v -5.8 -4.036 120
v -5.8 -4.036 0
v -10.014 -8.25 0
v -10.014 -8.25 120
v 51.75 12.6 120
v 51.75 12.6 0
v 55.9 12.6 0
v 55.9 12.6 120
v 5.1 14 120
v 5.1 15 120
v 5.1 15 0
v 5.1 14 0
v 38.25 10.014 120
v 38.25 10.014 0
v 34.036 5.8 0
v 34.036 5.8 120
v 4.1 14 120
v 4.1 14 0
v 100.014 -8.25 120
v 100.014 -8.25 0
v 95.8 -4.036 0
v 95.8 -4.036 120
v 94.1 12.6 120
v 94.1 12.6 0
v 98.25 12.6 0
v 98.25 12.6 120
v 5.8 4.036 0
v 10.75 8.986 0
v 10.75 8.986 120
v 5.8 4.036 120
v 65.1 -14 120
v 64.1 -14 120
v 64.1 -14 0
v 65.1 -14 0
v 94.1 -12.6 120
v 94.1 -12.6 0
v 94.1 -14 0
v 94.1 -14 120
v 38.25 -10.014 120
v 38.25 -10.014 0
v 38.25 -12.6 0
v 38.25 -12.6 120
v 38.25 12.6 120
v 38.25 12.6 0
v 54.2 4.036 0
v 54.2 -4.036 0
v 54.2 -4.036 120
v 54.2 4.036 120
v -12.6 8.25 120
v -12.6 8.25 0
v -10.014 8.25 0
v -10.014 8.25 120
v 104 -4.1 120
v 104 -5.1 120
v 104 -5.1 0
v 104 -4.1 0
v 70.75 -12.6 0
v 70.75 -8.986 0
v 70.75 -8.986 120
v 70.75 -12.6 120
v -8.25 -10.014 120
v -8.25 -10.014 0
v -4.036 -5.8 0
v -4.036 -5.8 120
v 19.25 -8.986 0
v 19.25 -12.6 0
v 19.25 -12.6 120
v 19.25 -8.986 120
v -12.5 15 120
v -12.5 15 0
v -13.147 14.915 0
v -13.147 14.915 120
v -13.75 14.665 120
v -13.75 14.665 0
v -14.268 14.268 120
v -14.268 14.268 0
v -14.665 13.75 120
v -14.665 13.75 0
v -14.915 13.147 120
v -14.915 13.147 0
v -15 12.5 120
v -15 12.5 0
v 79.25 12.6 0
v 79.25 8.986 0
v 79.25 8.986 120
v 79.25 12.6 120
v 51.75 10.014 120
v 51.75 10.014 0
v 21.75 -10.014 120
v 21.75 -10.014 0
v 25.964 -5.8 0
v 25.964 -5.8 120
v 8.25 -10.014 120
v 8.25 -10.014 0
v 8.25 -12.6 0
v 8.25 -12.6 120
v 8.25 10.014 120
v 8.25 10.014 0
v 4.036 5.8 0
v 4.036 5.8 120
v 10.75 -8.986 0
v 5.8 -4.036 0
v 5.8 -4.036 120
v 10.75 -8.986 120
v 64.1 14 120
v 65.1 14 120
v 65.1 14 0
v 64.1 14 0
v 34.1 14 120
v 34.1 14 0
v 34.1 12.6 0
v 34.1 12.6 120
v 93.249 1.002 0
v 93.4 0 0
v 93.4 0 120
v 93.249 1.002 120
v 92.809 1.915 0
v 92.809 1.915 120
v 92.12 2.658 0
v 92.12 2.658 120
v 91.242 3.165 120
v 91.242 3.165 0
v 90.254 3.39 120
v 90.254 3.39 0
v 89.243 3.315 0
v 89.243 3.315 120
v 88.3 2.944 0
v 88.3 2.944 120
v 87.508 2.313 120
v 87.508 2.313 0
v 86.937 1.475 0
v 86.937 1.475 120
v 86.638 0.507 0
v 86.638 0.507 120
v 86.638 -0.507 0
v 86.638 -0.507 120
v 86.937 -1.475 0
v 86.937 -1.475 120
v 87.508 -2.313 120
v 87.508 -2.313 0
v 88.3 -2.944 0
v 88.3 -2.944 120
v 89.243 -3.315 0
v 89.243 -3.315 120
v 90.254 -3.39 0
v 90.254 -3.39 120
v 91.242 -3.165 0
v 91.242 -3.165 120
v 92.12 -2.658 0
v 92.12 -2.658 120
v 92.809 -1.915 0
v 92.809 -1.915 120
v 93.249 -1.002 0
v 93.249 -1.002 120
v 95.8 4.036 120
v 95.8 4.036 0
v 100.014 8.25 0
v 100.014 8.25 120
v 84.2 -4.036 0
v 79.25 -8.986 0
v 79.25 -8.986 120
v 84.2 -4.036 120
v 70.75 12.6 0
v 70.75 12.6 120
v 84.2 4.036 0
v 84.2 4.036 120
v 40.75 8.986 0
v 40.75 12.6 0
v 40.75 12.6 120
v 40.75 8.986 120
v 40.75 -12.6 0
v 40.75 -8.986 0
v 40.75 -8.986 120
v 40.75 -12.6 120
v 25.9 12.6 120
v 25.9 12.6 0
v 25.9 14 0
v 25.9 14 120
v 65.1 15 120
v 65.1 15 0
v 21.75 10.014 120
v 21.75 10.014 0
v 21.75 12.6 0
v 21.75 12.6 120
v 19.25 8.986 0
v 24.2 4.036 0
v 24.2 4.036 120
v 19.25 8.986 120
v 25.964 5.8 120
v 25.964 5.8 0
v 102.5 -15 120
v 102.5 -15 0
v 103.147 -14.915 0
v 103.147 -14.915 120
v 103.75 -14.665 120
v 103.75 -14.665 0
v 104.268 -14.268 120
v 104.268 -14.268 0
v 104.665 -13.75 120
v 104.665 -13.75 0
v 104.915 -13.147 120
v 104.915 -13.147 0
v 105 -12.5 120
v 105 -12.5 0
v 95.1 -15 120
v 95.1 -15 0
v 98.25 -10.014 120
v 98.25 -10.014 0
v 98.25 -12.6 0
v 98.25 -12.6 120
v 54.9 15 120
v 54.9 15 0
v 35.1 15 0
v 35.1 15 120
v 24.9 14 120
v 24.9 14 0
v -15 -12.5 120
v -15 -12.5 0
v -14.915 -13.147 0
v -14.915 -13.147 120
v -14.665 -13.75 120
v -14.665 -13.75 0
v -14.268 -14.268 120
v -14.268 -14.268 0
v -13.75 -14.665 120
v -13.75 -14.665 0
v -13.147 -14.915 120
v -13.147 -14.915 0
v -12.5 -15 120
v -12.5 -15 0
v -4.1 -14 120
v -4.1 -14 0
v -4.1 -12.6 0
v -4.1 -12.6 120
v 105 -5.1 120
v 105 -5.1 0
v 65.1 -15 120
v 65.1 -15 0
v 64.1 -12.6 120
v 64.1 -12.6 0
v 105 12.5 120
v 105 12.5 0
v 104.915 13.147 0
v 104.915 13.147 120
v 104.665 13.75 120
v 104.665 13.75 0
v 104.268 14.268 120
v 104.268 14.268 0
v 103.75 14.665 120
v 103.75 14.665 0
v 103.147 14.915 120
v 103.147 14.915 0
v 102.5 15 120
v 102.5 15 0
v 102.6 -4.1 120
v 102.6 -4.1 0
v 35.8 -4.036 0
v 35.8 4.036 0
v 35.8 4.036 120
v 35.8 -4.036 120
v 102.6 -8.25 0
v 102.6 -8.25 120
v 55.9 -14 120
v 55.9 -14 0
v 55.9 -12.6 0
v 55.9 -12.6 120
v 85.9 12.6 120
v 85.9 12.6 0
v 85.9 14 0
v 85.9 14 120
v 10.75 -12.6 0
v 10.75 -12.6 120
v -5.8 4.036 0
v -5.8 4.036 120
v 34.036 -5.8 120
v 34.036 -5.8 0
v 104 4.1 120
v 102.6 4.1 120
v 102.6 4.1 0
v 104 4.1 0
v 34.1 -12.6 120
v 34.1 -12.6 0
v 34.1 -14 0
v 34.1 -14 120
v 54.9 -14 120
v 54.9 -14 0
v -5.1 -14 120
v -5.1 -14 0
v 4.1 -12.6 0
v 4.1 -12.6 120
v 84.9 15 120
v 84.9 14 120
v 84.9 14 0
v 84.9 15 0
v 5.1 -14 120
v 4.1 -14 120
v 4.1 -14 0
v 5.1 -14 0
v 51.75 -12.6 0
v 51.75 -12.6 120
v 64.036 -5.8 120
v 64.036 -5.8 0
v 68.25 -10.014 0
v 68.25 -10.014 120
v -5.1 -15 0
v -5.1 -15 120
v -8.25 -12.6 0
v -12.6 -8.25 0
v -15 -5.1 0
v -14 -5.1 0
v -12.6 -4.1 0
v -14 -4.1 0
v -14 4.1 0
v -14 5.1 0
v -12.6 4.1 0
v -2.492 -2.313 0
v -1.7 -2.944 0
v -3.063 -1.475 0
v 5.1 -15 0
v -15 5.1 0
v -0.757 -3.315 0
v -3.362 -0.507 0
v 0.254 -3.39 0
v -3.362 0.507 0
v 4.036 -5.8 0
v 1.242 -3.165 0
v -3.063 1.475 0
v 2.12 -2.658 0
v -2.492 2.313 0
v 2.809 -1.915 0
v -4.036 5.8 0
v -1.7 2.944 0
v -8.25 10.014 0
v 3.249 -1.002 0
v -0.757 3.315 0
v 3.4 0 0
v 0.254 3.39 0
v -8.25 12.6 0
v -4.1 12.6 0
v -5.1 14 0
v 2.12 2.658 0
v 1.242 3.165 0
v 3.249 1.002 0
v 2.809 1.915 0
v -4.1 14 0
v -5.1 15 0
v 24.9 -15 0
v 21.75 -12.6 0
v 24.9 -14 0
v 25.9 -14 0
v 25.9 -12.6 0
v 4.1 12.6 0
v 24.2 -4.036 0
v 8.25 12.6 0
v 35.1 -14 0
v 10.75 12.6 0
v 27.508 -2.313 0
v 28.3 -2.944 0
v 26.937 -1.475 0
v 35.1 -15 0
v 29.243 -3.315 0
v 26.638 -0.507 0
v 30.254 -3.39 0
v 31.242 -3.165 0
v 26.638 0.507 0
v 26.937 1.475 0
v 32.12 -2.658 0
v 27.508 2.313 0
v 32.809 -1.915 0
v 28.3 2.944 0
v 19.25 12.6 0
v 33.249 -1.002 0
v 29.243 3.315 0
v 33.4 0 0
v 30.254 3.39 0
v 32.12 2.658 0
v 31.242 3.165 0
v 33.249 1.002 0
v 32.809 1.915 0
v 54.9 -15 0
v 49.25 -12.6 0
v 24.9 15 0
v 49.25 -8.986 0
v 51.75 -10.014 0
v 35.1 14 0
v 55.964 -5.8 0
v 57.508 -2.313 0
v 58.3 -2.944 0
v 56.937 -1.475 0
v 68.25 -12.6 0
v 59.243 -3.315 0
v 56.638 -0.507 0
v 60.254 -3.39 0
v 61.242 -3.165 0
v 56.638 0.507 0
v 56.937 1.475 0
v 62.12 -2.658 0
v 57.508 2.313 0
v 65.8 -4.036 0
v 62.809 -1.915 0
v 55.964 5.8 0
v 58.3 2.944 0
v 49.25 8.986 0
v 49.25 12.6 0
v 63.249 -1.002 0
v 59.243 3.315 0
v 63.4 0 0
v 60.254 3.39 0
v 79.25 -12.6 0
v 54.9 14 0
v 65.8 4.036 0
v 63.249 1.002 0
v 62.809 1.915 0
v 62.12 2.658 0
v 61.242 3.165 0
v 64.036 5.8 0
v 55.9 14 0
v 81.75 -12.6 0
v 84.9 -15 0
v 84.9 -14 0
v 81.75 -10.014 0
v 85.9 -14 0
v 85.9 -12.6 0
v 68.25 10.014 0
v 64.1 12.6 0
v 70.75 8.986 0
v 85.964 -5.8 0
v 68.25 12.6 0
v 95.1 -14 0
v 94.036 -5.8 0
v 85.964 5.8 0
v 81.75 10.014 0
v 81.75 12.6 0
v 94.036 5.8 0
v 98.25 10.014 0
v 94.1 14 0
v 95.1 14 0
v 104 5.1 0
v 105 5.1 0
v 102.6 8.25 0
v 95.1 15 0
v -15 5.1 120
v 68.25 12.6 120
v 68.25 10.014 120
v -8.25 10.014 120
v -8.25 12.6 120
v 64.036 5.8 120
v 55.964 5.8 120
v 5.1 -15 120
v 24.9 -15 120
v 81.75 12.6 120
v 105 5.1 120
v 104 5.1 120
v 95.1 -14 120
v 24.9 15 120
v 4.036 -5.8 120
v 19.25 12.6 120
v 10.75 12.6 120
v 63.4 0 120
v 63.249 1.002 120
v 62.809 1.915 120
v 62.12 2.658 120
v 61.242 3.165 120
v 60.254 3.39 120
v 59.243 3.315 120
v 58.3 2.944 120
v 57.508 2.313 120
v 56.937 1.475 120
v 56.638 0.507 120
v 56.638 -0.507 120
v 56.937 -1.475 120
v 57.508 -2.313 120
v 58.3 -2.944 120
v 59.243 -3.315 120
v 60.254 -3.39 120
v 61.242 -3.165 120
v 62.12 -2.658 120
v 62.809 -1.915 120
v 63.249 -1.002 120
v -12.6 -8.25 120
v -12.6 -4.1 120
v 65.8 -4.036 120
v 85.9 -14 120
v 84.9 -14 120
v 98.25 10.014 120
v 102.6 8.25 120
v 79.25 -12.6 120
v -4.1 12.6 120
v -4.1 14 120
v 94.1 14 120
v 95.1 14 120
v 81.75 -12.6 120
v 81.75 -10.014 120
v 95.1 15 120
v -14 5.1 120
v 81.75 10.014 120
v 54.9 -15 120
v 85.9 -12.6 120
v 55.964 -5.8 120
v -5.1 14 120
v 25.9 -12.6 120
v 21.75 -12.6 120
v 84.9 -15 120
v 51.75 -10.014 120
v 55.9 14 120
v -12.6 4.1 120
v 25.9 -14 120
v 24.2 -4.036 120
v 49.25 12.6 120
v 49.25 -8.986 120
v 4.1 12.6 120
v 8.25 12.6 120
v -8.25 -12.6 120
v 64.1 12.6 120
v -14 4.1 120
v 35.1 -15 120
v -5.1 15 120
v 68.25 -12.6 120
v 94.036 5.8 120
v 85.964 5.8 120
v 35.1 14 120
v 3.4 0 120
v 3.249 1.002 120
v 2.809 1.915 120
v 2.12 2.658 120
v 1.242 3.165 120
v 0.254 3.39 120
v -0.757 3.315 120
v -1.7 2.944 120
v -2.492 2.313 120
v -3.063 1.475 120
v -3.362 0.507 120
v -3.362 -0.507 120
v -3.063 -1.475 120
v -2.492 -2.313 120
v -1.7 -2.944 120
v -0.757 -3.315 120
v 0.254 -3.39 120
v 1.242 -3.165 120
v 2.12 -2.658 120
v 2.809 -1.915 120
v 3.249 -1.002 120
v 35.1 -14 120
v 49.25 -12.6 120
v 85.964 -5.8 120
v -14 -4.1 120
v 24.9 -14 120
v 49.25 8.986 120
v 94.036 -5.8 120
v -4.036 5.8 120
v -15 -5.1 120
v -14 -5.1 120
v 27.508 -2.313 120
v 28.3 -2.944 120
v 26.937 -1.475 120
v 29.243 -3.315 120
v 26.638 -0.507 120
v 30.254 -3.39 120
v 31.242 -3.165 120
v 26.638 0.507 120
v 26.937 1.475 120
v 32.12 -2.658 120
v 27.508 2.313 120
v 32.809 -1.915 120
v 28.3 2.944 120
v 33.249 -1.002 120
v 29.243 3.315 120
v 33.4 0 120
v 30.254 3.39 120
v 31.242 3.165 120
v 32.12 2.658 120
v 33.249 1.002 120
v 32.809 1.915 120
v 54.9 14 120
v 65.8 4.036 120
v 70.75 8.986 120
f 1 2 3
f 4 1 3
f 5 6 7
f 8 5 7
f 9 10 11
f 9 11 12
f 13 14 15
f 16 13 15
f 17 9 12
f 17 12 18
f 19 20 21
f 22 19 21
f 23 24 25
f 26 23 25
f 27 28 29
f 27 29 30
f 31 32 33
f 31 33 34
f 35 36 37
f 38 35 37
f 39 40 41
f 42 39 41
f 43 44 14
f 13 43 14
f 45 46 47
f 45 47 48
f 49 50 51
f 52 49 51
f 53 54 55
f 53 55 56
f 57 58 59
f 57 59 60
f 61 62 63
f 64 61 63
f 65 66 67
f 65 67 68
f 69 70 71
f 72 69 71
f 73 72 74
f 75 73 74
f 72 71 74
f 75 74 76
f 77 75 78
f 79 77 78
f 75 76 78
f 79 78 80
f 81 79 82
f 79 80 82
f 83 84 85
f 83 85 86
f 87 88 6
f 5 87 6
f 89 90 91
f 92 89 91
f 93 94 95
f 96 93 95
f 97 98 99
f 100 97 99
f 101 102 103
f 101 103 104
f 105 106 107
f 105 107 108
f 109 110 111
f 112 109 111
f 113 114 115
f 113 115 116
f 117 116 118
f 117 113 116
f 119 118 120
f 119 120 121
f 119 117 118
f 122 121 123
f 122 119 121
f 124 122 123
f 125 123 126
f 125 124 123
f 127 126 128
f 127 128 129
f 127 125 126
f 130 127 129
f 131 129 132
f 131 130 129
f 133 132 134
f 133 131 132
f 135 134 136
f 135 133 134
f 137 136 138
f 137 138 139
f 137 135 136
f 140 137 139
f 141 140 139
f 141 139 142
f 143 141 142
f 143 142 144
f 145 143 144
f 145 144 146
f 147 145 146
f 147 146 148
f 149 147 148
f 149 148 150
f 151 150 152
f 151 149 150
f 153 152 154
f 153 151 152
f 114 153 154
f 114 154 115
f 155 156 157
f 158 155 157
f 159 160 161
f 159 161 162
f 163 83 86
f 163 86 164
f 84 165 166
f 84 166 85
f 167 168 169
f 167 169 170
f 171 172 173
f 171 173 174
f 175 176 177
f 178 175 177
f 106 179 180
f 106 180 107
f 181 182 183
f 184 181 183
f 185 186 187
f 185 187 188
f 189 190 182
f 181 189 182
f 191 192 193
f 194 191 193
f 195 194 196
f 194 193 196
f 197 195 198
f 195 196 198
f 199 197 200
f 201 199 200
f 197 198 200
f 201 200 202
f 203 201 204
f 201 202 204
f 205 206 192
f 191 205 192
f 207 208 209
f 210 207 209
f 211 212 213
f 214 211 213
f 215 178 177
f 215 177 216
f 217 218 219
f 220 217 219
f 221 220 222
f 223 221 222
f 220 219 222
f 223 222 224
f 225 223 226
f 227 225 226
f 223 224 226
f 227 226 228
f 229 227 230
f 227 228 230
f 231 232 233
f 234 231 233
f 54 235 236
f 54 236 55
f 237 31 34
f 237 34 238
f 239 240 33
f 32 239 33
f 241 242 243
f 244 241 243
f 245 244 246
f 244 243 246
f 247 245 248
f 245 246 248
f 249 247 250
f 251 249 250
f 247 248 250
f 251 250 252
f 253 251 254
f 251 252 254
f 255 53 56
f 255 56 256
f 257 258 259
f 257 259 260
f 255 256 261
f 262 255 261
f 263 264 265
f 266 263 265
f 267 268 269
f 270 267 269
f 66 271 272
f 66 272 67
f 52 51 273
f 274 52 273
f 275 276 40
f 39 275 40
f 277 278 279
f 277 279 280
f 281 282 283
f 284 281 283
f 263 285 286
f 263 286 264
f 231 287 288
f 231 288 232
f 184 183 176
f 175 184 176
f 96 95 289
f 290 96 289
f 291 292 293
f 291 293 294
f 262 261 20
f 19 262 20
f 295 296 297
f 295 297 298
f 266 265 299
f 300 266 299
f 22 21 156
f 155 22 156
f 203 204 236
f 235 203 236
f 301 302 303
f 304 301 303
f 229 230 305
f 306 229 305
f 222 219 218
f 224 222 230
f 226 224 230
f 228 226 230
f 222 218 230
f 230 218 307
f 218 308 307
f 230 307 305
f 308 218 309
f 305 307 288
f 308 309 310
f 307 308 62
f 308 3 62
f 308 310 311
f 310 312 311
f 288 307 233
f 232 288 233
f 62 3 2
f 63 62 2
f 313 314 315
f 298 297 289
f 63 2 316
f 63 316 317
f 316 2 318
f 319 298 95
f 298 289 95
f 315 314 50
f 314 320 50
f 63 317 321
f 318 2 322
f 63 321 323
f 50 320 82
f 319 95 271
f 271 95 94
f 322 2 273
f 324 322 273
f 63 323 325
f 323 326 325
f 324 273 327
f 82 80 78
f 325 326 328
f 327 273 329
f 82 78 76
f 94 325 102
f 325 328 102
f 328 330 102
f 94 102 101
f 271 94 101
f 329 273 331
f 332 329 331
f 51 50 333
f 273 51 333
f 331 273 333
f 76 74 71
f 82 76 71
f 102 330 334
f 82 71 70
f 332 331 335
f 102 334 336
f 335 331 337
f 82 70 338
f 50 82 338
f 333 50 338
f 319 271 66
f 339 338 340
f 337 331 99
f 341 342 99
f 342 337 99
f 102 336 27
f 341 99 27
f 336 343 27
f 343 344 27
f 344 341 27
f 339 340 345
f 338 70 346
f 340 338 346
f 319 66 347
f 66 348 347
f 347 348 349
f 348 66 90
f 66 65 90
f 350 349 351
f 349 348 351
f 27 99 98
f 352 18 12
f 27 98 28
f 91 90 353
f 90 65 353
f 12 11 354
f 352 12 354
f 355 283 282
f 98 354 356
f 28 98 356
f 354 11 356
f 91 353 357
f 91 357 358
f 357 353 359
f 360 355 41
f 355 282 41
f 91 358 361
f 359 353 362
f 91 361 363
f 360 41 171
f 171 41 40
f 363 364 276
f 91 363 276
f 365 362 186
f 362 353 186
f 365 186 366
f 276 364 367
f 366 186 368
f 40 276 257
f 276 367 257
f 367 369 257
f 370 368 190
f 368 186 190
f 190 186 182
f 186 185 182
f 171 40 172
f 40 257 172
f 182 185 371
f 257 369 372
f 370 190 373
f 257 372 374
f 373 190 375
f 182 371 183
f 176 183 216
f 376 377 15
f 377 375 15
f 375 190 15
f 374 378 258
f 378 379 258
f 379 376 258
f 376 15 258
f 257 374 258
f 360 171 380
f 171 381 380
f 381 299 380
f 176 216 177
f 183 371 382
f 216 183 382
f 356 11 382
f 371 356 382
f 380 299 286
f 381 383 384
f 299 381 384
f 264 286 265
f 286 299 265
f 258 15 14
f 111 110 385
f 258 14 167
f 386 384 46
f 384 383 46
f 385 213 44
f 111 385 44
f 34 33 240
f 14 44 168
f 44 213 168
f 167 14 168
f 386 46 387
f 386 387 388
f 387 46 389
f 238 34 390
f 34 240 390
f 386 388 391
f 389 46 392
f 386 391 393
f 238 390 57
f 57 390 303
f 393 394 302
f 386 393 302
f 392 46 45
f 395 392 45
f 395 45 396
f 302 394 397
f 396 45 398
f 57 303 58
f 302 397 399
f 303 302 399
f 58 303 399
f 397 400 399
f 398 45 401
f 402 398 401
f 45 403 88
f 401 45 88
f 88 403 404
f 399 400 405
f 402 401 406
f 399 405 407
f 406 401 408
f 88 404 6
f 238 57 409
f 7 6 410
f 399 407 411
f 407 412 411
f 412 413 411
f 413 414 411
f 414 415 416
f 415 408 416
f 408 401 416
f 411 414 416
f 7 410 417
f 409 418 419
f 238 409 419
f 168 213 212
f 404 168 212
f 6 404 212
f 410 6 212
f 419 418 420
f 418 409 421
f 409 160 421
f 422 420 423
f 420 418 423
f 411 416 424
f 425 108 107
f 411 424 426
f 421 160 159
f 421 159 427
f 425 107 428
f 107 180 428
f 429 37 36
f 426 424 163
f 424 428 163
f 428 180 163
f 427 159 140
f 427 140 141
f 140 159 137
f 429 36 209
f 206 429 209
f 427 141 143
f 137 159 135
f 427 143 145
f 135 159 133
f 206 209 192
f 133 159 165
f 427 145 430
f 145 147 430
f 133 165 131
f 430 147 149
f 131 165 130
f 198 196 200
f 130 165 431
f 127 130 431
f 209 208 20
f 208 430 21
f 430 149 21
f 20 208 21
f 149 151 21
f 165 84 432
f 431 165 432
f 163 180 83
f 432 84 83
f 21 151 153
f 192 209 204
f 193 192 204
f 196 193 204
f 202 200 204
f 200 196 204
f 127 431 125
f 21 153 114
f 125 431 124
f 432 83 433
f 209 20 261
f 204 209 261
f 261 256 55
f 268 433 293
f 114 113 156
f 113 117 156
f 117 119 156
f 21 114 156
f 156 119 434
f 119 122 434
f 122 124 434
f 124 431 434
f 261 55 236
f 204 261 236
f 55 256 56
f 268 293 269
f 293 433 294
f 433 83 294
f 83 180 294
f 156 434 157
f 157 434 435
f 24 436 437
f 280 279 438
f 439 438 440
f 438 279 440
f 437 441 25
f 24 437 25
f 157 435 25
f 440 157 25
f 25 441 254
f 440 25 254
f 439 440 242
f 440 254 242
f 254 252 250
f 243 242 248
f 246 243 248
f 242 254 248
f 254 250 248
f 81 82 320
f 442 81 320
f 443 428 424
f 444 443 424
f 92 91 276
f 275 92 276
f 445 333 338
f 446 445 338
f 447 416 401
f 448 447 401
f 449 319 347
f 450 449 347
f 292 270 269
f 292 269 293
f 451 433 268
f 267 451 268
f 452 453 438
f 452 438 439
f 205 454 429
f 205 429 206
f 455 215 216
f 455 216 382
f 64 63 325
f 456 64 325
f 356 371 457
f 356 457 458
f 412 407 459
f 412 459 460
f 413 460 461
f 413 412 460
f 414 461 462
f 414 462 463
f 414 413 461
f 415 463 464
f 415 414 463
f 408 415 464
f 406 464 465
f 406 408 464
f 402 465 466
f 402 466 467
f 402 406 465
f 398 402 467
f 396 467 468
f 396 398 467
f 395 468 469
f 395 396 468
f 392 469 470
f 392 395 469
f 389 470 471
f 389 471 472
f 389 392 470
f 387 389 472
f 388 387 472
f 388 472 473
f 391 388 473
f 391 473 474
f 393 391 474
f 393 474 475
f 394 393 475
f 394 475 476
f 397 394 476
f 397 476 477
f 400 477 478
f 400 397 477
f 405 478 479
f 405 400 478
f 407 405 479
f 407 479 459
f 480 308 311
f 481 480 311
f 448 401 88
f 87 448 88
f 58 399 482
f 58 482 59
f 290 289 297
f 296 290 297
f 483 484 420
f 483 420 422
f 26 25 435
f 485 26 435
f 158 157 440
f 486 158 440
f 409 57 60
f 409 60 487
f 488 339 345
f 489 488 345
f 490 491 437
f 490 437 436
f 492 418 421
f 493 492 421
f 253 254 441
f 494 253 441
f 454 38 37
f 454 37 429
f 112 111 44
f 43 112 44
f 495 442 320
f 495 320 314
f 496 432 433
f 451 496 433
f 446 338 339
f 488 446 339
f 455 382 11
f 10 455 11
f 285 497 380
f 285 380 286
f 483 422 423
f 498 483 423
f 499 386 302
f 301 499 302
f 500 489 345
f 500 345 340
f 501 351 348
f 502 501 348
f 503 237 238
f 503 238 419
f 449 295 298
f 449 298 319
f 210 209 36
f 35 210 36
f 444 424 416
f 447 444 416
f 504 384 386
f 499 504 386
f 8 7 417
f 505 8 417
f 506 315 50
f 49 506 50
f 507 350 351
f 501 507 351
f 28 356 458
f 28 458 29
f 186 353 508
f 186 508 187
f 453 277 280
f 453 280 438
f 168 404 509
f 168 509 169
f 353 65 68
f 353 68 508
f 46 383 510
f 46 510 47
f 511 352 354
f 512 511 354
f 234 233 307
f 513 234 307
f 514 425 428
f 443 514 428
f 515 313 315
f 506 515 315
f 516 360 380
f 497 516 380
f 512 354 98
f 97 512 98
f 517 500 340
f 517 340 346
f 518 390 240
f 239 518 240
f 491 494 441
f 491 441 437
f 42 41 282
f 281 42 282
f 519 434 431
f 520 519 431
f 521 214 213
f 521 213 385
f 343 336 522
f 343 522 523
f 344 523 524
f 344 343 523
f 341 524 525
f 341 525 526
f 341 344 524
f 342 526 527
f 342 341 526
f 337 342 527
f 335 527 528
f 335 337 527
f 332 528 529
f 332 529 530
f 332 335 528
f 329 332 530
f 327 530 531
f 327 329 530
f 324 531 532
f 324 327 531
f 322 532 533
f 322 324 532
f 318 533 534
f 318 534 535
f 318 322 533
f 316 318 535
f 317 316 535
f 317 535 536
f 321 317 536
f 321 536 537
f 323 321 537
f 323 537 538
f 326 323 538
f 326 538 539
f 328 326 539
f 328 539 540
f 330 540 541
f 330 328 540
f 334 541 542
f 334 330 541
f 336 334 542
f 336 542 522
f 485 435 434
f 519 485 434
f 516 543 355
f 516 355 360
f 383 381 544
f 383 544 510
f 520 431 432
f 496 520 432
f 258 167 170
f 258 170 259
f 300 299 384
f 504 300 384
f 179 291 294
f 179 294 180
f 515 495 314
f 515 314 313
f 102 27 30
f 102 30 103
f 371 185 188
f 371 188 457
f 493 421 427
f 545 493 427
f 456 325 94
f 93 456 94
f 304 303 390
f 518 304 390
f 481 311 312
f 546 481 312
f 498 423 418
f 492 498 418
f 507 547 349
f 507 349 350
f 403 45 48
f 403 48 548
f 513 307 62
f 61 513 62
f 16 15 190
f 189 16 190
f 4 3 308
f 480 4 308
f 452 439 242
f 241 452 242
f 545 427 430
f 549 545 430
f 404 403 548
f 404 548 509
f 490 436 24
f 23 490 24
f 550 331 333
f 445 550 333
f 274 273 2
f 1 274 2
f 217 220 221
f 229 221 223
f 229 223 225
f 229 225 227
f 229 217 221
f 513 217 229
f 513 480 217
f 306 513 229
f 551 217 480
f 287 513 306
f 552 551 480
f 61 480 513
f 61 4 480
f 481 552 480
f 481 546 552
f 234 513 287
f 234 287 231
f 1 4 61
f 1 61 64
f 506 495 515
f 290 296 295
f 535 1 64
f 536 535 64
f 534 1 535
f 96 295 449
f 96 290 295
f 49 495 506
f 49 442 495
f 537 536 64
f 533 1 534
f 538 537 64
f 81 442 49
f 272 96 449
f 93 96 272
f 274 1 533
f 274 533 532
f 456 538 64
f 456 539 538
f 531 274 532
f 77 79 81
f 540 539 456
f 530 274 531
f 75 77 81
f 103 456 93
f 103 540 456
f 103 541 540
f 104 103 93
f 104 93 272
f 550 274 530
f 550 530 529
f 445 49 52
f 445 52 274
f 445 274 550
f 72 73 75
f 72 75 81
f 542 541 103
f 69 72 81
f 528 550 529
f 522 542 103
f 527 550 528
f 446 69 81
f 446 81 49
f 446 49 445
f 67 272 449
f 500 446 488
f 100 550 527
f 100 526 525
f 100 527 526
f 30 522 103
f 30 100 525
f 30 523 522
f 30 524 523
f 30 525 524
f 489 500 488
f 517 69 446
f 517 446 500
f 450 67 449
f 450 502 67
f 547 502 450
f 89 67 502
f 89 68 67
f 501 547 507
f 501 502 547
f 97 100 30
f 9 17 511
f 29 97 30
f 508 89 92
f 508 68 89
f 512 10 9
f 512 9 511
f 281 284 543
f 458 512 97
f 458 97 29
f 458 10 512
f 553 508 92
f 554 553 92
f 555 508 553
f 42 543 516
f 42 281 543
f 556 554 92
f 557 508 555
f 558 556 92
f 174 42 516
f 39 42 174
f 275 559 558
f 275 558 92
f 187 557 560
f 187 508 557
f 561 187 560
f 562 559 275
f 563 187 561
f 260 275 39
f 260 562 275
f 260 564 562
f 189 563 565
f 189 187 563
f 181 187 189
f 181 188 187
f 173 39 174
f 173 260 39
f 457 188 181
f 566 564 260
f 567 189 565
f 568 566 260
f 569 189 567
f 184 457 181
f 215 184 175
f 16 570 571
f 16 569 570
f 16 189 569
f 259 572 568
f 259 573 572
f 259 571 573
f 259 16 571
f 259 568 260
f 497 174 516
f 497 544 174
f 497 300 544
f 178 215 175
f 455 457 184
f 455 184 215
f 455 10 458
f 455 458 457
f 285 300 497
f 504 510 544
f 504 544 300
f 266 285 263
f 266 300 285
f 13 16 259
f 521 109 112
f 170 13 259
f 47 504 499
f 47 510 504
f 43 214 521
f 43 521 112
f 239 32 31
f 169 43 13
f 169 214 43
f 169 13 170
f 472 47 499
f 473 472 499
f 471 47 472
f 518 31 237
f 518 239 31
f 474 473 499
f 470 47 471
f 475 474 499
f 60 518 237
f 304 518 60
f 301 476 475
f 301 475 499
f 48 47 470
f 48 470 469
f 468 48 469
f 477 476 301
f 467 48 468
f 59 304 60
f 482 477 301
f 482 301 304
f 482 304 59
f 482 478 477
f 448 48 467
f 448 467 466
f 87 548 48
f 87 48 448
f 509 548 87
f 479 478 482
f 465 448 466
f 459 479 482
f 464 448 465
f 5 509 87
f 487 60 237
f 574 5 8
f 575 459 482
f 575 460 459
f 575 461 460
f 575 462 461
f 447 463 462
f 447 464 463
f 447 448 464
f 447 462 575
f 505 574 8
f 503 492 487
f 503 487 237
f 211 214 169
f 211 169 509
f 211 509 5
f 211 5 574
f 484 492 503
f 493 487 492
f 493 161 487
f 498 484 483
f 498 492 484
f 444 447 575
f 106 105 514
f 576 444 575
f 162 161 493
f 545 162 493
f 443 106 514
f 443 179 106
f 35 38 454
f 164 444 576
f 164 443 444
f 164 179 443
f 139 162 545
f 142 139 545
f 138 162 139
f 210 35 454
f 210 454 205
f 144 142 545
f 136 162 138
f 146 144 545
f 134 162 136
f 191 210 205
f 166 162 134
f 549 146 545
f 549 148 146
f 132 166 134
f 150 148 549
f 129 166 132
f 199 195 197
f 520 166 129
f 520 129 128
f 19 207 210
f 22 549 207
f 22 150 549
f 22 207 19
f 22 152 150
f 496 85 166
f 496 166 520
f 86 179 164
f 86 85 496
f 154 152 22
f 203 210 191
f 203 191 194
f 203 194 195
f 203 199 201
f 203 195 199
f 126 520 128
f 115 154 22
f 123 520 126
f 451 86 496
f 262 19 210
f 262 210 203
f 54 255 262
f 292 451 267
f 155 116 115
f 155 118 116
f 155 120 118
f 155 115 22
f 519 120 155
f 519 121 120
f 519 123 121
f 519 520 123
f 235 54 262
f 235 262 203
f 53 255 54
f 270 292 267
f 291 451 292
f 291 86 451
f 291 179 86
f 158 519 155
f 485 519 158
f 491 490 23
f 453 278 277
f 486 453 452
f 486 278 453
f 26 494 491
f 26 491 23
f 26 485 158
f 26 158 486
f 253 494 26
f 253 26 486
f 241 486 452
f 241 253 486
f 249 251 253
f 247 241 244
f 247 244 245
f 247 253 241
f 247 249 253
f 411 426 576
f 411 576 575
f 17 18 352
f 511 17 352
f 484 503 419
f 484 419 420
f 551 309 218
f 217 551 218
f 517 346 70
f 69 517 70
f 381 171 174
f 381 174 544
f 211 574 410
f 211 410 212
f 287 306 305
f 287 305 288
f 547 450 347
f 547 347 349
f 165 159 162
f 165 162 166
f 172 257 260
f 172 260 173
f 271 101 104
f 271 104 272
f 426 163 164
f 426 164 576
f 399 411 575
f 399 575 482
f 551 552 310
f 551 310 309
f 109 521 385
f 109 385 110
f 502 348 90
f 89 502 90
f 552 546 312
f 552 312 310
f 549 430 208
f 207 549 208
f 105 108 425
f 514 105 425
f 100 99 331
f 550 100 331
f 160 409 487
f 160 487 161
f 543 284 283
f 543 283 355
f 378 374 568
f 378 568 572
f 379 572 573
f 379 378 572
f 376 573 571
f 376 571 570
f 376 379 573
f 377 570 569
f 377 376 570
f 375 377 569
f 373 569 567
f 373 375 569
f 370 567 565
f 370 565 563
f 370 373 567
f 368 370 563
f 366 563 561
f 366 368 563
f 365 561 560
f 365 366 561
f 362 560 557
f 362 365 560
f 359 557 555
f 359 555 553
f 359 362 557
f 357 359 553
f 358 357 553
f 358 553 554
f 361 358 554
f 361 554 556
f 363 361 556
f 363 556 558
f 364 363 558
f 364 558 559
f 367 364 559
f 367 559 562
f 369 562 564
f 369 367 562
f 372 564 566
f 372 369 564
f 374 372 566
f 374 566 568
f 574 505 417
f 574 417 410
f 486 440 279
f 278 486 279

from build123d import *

# Parameters (mm, degrees)
SKETCH_1_R      = 3.4
EXTRUDE_1_DEPTH = 120


with BuildPart() as part:
    # 草图1 → 凸台-拉伸1 (new body)
    with BuildSketch(Plane.XY):
        with BuildLine():
            Line((104, 5.1), (105, 5.1))
            Line((105, 5.1), (105, 12.5))
            ThreePointArc((105, 12.5), (104.267766953, 14.267766953), (102.5, 15))
            Line((102.5, 15), (95.1, 15))
            Line((95.1, 15), (95.1, 14))
            Line((95.1, 14), (94.1, 14))
            Line((94.1, 14), (94.1, 12.6))
            Line((94.1, 12.6), (98.25, 12.6))
            Line((98.25, 12.6), (98.25, 10.014213562))
            Line((98.25, 10.014213562), (94.035786438, 5.8))
            Line((94.035786438, 5.8), (85.964213562, 5.8))
            Line((85.964213562, 5.8), (81.75, 10.014213562))
            Line((81.75, 10.014213562), (81.75, 12.6))
            Line((81.75, 12.6), (85.9, 12.6))
            Line((85.9, 12.6), (85.9, 14))
            Line((85.9, 14), (84.9, 14))
            Line((84.9, 14), (84.9, 15))
            Line((84.9, 15), (65.1, 15))
            Line((65.1, 15), (65.1, 14))
            Line((65.1, 14), (64.1, 14))
            Line((64.1, 14), (64.1, 12.6))
            Line((64.1, 12.6), (68.25, 12.6))
            Line((68.25, 12.6), (68.25, 10.014213562))
            Line((68.25, 10.014213562), (64.035786438, 5.8))
            Line((64.035786438, 5.8), (55.964213562, 5.8))
            Line((55.964213562, 5.8), (51.75, 10.014213562))
            Line((51.75, 10.014213562), (51.75, 12.6))
            Line((51.75, 12.6), (55.9, 12.6))
            Line((55.9, 12.6), (55.9, 14))
            Line((55.9, 14), (54.9, 14))
            Line((54.9, 14), (54.9, 15))
            Line((54.9, 15), (35.1, 15))
            Line((35.1, 15), (35.1, 14))
            Line((35.1, 14), (34.1, 14))
            Line((34.1, 14), (34.1, 12.6))
            Line((34.1, 12.6), (38.25, 12.6))
            Line((38.25, 12.6), (38.25, 10.014213562))
            Line((38.25, 10.014213562), (34.035786438, 5.8))
            Line((34.035786438, 5.8), (25.964213562, 5.8))
            Line((25.964213562, 5.8), (21.75, 10.014213562))
            Line((21.75, 10.014213562), (21.75, 12.6))
            Line((21.75, 12.6), (25.9, 12.6))
            Line((25.9, 12.6), (25.9, 14))
            Line((25.9, 14), (24.9, 14))
            Line((24.9, 14), (24.9, 15))
            Line((24.9, 15), (5.1, 15))
            Line((5.1, 15), (5.1, 14))
            Line((5.1, 14), (4.1, 14))
            Line((4.1, 14), (4.1, 12.6))
            Line((4.1, 12.6), (8.25, 12.6))
            Line((8.25, 12.6), (8.25, 10.014213562))
            Line((8.25, 10.014213562), (4.035786438, 5.8))
            Line((4.035786438, 5.8), (-4.035786438, 5.8))
            Line((-4.035786438, 5.8), (-8.25, 10.014213562))
            Line((-8.25, 10.014213562), (-8.25, 12.6))
            Line((-8.25, 12.6), (-4.1, 12.6))
            Line((-4.1, 12.6), (-4.1, 14))
            Line((-4.1, 14), (-5.1, 14))
            Line((-5.1, 14), (-5.1, 15))
            Line((-5.1, 15), (-12.5, 15))
            ThreePointArc((-12.5, 15), (-14.267766953, 14.267766953), (-15, 12.5))
            Line((-15, 12.5), (-15, 5.1))
            Line((-15, 5.1), (-14, 5.1))
            Line((-14, 5.1), (-14, 4.1))
            Line((-14, 4.1), (-12.6, 4.1))
            Line((-12.6, 4.1), (-12.6, 8.25))
            Line((-12.6, 8.25), (-10.014213562, 8.25))
            Line((-10.014213562, 8.25), (-5.8, 4.035786438))
            Line((-5.8, 4.035786438), (-5.8, -4.035786438))
            Line((-5.8, -4.035786438), (-10.014213562, -8.25))
            Line((-10.014213562, -8.25), (-12.6, -8.25))
            Line((-12.6, -8.25), (-12.6, -4.1))
            Line((-12.6, -4.1), (-14, -4.1))
            Line((-14, -4.1), (-14, -5.1))
            Line((-14, -5.1), (-15, -5.1))
            Line((-15, -5.1), (-15, -12.5))
            ThreePointArc((-15, -12.5), (-14.267766953, -14.267766953), (-12.5, -15))
            Line((-12.5, -15), (-5.1, -15))
            Line((-5.1, -15), (-5.1, -14))
            Line((-5.1, -14), (-4.1, -14))
            Line((-4.1, -14), (-4.1, -12.6))
            Line((-4.1, -12.6), (-8.25, -12.6))
            Line((-8.25, -12.6), (-8.25, -10.014213562))
            Line((-8.25, -10.014213562), (-4.035786438, -5.8))
            Line((-4.035786438, -5.8), (4.035786438, -5.8))
            Line((4.035786438, -5.8), (8.25, -10.014213562))
            Line((8.25, -10.014213562), (8.25, -12.6))
            Line((8.25, -12.6), (4.1, -12.6))
            Line((4.1, -12.6), (4.1, -14))
            Line((4.1, -14), (5.1, -14))
            Line((5.1, -14), (5.1, -15))
            Line((5.1, -15), (24.9, -15))
            Line((24.9, -15), (24.9, -14))
            Line((24.9, -14), (25.9, -14))
            Line((25.9, -14), (25.9, -12.6))
            Line((25.9, -12.6), (21.75, -12.6))
            Line((21.75, -12.6), (21.75, -10.014213562))
            Line((21.75, -10.014213562), (25.964213562, -5.8))
            Line((25.964213562, -5.8), (34.035786438, -5.8))
            Line((34.035786438, -5.8), (38.25, -10.014213562))
            Line((38.25, -10.014213562), (38.25, -12.6))
            Line((38.25, -12.6), (34.1, -12.6))
            Line((34.1, -12.6), (34.1, -14))
            Line((34.1, -14), (35.1, -14))
            Line((35.1, -14), (35.1, -15))
            Line((35.1, -15), (54.9, -15))
            Line((54.9, -15), (54.9, -14))
            Line((54.9, -14), (55.9, -14))
            Line((55.9, -14), (55.9, -12.6))
            Line((55.9, -12.6), (51.75, -12.6))
            Line((51.75, -12.6), (51.75, -10.014213562))
            Line((51.75, -10.014213562), (55.964213562, -5.8))
            Line((55.964213562, -5.8), (64.035786438, -5.8))
            Line((64.035786438, -5.8), (68.25, -10.014213562))
            Line((68.25, -10.014213562), (68.25, -12.6))
            Line((68.25, -12.6), (64.1, -12.6))
            Line((64.1, -12.6), (64.1, -14))
            Line((64.1, -14), (65.1, -14))
            Line((65.1, -14), (65.1, -15))
            Line((65.1, -15), (84.9, -15))
            Line((84.9, -15), (84.9, -14))
            Line((84.9, -14), (85.9, -14))
            Line((85.9, -14), (85.9, -12.6))
            Line((85.9, -12.6), (81.75, -12.6))
            Line((81.75, -12.6), (81.75, -10.014213562))
            Line((81.75, -10.014213562), (85.964213562, -5.8))
            Line((85.964213562, -5.8), (94.035786438, -5.8))
            Line((94.035786438, -5.8), (98.25, -10.014213562))
            Line((98.25, -10.014213562), (98.25, -12.6))
            Line((98.25, -12.6), (94.1, -12.6))
            Line((94.1, -12.6), (94.1, -14))
            Line((94.1, -14), (95.1, -14))
            Line((95.1, -14), (95.1, -15))
            Line((95.1, -15), (102.5, -15))
            ThreePointArc((102.5, -15), (104.267766953, -14.267766953), (105, -12.5))
            Line((105, -12.5), (105, -5.1))
            Line((105, -5.1), (104, -5.1))
            Line((104, -5.1), (104, -4.1))
            Line((104, -4.1), (102.6, -4.1))
            Line((102.6, -4.1), (102.6, -8.25))
            Line((102.6, -8.25), (100.014213562, -8.25))
            Line((100.014213562, -8.25), (95.8, -4.035786438))
            Line((95.8, -4.035786438), (95.8, 4.035786438))
            Line((95.8, 4.035786438), (100.014213562, 8.25))
            Line((100.014213562, 8.25), (102.6, 8.25))
            Line((102.6, 8.25), (102.6, 4.1))
            Line((102.6, 4.1), (104, 4.1))
            Line((104, 4.1), (104, 5.1))
        make_face()
        with Locations((90, 0)):
            Circle(SKETCH_1_R, mode=Mode.SUBTRACT)
        with Locations((60, 0)):
            Circle(SKETCH_1_R, mode=Mode.SUBTRACT)
        with Locations((30, 0)):
            Circle(SKETCH_1_R, mode=Mode.SUBTRACT)
        Circle(SKETCH_1_R, mode=Mode.SUBTRACT)
        Polygon((84.2, -4.035786438), (84.2, 4.035786438), (79.25, 8.985786438), (79.25, 12.6), (70.75, 12.6), (70.75, 8.985786438), (65.8, 4.035786438), (65.8, -4.035786438), (70.75, -8.985786438), (70.75, -12.6), (79.25, -12.6), (79.25, -8.985786438), align=None, mode=Mode.SUBTRACT)
        Polygon((54.2, -4.035786438), (54.2, 4.035786438), (49.25, 8.985786438), (49.25, 12.6), (40.75, 12.6), (40.75, 8.985786438), (35.8, 4.035786438), (35.8, -4.035786438), (40.75, -8.985786438), (40.75, -12.6), (49.25, -12.6), (49.25, -8.985786438), align=None, mode=Mode.SUBTRACT)
        Polygon((24.2, -4.035786438), (24.2, 4.035786438), (19.25, 8.985786438), (19.25, 12.6), (10.75, 12.6), (10.75, 8.985786438), (5.8, 4.035786438), (5.8, -4.035786438), (10.75, -8.985786438), (10.75, -12.6), (19.25, -12.6), (19.25, -8.985786438), align=None, mode=Mode.SUBTRACT)
    extrude(amount=EXTRUDE_1_DEPTH)


solid = part.part
